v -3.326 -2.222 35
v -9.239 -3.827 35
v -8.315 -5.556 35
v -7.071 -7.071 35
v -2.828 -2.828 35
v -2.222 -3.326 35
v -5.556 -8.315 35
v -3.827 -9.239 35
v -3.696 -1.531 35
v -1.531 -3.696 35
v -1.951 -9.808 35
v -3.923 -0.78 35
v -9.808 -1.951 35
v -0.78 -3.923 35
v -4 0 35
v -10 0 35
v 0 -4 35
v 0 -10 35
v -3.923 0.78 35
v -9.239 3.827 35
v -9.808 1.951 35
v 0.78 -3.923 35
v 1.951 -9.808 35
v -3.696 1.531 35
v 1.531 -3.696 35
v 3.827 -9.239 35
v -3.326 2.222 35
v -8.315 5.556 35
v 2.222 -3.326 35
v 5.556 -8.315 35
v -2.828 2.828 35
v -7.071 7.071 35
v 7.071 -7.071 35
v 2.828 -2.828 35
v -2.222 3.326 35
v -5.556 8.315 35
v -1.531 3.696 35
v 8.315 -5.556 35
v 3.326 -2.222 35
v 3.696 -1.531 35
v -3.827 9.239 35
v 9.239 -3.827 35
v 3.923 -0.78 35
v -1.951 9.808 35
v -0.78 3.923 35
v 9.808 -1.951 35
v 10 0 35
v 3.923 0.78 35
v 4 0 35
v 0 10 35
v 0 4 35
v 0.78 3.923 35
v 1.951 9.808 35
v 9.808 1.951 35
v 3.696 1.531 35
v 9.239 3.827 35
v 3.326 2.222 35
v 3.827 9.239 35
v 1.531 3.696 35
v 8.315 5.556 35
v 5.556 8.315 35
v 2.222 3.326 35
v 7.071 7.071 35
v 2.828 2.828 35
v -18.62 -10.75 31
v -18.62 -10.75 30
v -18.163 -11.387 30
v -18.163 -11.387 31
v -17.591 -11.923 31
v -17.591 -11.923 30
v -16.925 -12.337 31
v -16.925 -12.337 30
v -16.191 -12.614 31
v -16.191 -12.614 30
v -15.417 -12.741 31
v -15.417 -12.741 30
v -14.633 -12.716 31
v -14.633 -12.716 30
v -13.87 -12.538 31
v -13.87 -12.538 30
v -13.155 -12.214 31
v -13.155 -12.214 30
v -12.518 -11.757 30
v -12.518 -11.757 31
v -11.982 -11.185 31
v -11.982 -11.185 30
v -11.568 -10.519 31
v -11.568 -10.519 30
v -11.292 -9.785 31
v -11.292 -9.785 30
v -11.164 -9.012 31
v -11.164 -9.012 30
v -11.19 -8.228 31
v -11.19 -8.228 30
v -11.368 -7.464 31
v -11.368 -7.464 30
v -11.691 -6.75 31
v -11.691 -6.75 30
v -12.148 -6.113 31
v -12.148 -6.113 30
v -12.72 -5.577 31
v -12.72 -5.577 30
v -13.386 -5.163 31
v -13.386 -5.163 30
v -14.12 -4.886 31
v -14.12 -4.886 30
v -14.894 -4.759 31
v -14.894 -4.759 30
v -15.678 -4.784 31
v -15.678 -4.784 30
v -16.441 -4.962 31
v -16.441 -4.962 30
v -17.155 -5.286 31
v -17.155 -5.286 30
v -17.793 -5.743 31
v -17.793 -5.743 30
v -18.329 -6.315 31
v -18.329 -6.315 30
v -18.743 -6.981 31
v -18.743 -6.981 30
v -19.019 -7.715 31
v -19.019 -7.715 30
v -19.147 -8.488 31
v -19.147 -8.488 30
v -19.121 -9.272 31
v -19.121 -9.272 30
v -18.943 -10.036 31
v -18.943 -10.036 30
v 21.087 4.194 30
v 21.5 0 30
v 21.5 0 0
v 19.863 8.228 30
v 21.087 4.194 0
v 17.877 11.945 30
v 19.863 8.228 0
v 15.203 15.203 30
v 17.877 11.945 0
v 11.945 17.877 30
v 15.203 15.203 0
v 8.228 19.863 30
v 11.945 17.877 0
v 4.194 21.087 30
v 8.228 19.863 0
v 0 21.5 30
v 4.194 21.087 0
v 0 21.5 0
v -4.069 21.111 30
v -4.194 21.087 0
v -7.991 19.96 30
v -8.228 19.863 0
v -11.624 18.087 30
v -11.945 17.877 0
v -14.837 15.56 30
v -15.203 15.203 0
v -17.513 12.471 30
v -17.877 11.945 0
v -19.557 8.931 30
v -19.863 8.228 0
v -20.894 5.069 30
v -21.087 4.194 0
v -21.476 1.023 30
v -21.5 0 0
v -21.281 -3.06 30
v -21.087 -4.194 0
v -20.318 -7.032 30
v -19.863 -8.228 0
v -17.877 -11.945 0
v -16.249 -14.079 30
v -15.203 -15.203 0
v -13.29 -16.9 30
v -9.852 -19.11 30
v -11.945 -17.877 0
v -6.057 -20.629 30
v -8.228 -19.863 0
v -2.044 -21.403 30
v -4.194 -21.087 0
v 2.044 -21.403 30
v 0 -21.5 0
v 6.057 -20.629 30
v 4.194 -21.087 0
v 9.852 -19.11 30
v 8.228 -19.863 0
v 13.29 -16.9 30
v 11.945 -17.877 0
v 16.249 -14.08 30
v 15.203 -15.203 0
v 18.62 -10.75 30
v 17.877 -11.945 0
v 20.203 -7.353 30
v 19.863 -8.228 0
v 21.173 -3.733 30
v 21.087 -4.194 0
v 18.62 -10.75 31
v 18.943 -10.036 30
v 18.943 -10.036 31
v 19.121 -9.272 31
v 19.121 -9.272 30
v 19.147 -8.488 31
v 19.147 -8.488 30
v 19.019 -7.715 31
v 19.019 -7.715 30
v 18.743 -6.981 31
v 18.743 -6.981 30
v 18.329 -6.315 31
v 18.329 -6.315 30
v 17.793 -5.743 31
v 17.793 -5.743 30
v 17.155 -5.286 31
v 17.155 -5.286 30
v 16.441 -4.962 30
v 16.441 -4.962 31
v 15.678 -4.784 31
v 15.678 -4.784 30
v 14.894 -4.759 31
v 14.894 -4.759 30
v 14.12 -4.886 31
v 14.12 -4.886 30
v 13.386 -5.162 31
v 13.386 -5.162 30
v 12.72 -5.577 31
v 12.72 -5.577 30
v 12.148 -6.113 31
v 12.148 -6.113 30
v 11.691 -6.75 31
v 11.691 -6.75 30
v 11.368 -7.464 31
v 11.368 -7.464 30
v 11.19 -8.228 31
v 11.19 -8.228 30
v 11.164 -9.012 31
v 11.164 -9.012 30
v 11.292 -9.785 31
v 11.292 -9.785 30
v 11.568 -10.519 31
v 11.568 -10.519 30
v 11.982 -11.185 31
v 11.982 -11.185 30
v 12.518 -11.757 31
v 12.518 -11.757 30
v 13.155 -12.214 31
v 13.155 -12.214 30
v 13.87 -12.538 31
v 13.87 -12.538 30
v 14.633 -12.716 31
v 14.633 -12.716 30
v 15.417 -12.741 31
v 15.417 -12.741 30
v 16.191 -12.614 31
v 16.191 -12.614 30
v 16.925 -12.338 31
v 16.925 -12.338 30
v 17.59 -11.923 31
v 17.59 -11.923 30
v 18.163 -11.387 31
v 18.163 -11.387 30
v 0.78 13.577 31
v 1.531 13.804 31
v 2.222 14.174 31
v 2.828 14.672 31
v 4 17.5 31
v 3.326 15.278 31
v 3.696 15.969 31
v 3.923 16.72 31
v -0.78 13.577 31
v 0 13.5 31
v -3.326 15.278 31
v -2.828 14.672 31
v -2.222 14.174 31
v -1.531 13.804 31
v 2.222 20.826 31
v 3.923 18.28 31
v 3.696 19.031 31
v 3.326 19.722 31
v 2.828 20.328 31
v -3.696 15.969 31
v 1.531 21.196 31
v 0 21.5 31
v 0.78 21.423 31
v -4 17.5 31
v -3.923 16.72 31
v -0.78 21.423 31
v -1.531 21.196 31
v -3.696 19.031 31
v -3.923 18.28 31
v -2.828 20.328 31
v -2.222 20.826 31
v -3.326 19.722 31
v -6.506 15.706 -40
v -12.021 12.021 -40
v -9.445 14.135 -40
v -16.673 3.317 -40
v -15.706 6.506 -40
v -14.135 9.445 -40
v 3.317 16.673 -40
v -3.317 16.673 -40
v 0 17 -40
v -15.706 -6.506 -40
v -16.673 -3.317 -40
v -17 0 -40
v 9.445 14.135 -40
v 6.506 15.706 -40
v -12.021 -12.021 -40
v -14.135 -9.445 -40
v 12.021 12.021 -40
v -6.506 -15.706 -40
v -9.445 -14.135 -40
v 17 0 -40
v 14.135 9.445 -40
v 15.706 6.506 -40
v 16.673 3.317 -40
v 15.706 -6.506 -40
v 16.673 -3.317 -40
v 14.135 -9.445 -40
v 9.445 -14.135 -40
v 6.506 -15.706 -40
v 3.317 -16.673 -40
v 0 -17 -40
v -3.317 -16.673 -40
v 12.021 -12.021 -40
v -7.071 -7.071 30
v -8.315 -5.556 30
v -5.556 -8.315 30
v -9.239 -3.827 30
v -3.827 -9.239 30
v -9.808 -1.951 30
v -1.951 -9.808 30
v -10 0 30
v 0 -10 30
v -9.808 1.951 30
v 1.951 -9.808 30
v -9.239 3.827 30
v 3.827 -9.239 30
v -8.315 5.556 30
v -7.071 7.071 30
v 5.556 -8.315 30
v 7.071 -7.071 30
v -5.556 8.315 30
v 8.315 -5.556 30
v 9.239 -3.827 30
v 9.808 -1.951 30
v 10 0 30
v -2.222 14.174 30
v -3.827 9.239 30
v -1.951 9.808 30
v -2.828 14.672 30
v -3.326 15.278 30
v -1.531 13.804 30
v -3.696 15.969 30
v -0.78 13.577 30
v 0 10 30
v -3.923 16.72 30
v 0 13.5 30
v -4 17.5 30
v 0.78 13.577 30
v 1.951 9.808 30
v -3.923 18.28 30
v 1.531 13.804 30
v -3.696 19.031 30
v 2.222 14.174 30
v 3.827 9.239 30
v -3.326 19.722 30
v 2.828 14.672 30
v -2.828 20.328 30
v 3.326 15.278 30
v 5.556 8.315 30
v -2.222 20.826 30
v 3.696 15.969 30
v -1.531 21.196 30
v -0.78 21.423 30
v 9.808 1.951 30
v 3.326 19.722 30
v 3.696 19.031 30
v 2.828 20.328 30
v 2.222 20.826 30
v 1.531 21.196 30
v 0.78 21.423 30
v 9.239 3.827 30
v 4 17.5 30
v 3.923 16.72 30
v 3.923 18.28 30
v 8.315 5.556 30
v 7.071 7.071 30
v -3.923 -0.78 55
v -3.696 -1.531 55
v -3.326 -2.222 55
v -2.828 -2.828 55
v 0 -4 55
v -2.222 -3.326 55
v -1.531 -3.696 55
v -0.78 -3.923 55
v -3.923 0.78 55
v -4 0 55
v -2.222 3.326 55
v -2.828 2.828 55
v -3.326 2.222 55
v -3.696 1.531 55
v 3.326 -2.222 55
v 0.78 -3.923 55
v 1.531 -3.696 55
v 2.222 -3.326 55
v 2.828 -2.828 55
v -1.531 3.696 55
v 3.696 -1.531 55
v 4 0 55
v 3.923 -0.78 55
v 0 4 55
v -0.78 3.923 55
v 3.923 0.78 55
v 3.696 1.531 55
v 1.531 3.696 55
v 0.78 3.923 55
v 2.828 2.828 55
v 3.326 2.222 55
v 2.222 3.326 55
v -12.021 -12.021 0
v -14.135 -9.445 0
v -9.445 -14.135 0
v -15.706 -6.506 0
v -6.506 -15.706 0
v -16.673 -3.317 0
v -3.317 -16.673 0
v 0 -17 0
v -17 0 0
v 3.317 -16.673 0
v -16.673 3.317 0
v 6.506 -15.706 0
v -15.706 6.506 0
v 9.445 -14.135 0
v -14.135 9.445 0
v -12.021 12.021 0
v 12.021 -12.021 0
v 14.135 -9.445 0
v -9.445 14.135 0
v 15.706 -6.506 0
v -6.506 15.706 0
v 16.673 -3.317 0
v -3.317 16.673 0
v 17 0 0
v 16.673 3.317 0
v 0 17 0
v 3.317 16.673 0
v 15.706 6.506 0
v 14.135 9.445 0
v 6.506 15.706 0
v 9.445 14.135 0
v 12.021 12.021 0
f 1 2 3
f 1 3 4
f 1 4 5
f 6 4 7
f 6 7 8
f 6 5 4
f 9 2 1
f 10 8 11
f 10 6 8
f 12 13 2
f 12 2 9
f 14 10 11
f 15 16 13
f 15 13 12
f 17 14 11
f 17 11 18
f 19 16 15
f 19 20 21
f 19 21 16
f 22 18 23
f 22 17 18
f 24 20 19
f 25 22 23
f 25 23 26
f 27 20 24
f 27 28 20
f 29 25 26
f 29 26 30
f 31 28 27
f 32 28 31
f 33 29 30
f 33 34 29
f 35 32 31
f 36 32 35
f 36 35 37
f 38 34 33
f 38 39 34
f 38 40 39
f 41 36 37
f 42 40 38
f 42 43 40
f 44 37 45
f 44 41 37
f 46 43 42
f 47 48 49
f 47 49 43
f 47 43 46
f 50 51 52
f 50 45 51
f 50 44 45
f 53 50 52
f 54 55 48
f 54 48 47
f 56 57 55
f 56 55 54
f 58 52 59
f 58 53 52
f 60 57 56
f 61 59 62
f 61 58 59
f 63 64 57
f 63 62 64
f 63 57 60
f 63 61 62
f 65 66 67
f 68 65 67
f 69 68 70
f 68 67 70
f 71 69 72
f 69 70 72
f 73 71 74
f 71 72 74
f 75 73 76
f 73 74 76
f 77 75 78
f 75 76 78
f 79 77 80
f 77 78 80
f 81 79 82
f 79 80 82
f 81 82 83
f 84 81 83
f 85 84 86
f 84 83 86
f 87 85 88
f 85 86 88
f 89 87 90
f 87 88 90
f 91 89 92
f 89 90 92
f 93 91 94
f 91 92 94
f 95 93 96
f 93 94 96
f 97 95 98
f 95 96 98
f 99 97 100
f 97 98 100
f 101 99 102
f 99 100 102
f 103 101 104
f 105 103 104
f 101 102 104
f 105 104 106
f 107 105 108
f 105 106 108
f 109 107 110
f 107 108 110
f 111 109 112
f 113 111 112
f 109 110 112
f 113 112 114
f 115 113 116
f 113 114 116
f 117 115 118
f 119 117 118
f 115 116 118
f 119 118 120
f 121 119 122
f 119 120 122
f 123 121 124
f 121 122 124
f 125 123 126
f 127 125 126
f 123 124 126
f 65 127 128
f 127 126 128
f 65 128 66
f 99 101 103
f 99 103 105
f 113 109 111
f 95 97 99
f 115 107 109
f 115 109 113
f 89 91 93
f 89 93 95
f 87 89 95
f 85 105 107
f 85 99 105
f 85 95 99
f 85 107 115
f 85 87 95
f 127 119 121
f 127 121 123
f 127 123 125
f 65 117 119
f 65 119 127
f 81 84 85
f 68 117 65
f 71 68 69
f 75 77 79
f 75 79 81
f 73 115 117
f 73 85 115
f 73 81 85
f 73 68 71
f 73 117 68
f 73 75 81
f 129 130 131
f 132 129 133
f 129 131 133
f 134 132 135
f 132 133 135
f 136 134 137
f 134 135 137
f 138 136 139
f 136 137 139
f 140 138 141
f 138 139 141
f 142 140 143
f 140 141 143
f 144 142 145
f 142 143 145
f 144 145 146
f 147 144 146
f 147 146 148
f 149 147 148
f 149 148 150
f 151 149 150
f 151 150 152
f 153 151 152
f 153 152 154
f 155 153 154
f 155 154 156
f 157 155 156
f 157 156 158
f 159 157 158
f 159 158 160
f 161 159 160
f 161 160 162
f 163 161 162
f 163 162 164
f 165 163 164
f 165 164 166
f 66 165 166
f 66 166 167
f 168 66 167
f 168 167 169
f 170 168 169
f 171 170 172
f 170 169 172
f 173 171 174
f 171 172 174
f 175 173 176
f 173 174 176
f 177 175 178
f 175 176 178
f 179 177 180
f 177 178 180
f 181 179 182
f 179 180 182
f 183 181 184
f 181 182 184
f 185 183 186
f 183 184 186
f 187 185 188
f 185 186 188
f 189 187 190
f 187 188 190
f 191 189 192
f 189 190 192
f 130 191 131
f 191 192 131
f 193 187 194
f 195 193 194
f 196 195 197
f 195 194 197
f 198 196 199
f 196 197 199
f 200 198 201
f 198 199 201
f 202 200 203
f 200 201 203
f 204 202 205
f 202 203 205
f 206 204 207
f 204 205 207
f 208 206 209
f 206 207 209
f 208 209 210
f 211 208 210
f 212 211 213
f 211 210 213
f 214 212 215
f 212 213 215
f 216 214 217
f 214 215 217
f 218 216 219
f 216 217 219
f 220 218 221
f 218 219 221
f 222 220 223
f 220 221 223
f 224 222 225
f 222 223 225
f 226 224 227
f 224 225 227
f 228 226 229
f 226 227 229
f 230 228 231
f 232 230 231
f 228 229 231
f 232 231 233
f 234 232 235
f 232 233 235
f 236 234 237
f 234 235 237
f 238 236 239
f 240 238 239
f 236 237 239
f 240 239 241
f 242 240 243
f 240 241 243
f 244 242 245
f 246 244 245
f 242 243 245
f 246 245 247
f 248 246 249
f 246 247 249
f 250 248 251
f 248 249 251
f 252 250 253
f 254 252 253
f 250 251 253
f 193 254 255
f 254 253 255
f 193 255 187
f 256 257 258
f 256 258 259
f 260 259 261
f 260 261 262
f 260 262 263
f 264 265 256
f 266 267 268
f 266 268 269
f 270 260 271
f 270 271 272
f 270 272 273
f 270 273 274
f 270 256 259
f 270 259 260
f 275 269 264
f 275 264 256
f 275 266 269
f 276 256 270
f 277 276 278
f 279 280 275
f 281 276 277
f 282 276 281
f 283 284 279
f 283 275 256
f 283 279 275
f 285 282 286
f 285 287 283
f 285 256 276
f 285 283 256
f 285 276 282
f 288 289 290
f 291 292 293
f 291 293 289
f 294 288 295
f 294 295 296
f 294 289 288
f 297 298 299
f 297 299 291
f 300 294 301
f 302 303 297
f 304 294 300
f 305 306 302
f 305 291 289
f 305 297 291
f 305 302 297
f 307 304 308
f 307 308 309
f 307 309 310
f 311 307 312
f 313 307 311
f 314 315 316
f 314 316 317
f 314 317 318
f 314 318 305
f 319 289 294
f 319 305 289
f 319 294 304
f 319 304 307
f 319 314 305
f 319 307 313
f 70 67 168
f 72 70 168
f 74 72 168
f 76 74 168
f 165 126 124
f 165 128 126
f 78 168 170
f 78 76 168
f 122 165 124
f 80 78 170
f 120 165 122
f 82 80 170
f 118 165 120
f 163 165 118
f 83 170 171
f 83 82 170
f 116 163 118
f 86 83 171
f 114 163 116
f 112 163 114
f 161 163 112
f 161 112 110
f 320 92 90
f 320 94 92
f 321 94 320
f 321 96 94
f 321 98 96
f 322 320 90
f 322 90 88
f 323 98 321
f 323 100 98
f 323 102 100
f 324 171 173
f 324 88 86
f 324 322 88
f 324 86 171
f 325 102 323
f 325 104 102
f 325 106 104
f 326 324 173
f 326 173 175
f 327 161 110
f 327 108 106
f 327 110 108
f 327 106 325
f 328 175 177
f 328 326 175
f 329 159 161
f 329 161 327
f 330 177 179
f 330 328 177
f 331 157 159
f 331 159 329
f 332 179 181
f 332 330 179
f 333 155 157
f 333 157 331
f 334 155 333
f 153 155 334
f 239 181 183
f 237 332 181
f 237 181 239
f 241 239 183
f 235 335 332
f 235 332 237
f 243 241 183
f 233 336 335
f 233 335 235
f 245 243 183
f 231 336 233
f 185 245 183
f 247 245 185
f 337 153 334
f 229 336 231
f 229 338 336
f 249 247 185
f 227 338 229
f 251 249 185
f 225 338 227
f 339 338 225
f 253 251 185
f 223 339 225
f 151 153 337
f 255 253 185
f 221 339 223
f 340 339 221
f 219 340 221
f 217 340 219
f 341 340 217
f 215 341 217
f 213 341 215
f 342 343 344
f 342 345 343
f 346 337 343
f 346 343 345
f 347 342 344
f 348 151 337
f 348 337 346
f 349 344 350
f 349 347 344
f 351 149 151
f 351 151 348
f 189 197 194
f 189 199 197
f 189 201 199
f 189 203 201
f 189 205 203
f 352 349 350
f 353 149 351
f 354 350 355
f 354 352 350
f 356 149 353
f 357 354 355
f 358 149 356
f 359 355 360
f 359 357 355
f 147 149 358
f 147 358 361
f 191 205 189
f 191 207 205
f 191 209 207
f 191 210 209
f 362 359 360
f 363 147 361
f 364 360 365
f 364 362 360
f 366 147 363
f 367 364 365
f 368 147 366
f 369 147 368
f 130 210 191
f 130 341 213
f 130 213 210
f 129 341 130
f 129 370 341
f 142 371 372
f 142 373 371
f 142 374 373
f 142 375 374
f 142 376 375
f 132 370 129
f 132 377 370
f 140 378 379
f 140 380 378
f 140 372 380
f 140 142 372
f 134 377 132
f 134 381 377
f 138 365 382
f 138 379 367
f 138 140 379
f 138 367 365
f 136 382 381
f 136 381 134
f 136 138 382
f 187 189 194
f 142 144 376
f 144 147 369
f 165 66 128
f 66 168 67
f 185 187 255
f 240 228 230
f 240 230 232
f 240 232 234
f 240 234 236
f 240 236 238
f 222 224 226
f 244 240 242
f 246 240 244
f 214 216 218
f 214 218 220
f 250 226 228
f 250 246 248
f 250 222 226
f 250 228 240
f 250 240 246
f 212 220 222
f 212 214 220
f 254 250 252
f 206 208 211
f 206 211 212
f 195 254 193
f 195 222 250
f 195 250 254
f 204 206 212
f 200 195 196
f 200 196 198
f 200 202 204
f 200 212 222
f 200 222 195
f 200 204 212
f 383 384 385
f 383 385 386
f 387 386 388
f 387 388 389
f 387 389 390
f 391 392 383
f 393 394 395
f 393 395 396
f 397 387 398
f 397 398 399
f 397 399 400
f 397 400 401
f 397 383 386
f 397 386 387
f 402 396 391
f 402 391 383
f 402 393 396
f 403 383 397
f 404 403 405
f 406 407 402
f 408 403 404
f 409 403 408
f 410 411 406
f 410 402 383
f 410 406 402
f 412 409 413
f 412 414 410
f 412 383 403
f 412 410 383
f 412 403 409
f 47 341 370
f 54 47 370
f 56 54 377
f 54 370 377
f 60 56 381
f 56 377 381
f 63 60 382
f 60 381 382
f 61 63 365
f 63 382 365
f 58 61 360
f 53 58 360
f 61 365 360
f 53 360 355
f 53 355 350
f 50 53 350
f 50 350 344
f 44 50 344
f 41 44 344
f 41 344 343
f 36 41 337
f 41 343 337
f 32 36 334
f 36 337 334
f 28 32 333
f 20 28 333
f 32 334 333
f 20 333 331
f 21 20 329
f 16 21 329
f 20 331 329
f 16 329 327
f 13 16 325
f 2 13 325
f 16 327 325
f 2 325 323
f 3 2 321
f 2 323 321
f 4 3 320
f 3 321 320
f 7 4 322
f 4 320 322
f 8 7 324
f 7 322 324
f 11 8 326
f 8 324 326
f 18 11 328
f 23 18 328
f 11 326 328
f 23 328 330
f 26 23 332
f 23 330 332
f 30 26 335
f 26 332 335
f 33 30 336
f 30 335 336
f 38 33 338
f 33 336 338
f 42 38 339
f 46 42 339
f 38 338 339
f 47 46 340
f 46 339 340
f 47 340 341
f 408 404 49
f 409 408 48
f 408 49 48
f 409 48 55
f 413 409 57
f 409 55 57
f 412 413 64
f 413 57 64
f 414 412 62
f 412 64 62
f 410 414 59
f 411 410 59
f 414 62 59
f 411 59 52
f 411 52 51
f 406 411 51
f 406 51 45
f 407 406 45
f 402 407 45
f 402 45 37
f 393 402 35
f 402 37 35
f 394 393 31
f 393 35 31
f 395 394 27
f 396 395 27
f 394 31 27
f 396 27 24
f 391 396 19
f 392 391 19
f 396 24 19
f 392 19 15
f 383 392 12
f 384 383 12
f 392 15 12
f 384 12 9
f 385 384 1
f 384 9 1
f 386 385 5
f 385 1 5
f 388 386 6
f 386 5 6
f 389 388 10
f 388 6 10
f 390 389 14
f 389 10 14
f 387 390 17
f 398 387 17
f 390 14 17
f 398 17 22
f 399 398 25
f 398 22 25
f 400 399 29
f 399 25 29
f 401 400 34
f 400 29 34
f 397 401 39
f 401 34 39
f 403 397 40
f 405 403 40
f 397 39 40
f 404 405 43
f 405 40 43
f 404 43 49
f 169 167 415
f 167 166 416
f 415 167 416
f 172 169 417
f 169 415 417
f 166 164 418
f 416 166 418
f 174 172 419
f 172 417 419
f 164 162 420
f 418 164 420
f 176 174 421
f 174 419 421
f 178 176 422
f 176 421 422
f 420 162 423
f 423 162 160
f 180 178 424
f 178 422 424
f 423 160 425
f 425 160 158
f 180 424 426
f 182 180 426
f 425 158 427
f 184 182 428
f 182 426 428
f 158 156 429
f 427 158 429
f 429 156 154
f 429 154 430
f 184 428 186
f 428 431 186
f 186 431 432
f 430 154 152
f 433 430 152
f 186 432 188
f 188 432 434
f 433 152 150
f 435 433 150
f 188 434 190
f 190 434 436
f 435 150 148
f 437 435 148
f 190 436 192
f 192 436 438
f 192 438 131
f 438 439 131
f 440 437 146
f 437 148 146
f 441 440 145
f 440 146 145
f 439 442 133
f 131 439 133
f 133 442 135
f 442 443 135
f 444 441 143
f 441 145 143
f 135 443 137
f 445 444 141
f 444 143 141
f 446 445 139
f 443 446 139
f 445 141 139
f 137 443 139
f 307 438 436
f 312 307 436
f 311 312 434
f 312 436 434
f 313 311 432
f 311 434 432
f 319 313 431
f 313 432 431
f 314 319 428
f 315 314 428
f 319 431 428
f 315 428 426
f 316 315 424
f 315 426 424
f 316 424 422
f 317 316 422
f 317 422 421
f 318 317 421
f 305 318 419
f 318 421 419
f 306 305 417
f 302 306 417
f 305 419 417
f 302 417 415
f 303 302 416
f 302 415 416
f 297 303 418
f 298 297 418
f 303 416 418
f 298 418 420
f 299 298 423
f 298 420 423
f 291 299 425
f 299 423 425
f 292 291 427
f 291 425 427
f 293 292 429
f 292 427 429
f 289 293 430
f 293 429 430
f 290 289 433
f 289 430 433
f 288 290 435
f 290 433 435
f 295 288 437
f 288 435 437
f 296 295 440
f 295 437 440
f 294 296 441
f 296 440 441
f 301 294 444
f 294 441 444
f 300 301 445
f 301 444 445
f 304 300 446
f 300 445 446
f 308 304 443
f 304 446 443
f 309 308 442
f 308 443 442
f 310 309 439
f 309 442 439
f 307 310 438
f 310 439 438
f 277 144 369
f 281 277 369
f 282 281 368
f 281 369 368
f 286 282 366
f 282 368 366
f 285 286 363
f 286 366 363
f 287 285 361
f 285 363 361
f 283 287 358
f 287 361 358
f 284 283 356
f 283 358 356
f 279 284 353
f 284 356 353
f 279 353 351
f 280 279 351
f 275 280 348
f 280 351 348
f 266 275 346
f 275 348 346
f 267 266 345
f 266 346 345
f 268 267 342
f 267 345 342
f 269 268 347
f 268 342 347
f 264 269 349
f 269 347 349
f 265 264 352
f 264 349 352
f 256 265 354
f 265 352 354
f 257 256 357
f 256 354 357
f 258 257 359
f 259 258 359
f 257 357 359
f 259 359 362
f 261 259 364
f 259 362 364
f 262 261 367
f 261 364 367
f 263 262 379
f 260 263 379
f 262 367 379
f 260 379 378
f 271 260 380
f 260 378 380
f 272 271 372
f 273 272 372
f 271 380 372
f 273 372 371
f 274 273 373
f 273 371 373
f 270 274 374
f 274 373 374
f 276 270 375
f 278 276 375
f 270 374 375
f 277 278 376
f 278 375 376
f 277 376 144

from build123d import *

# Parameters (mm, degrees)
ESQUISSE1_R      = 21.5
EXTRUSION1_DEPTH = 30
ESQUISSE2_R      = 10
EXTRUSION2_DEPTH = 5
ESQUISSE3_R      = 4
EXTRUSION3_DEPTH = 20
ESQUISSE4_R      = 17
EXTRUSION4_DEPTH = 40
ESQUISSE5_R      = 4
EXTRUSION5_DEPTH = 1


with BuildPart() as part:
    # Esquisse1 → Extrusion1 (new body)
    with BuildSketch(Plane.XY):
        Circle(ESQUISSE1_R)
    extrude(amount=EXTRUSION1_DEPTH)

    # Esquisse2 → Extrusion2 (add)
    with BuildSketch(Plane.XY.offset(30)):
        Circle(ESQUISSE2_R)
    extrude(amount=EXTRUSION2_DEPTH)

    # Esquisse3 → Extrusion3 (add)
    with BuildSketch(Plane.XY.offset(35)):
        Circle(ESQUISSE3_R)
    extrude(amount=EXTRUSION3_DEPTH)

    # Esquisse4 → Extrusion4 (add)
    with BuildSketch(Plane(origin=(0, 0, 0), x_dir=(-1, 0, 0), z_dir=(0, 0, -1))):
        with Locations(Location((0, 0, 0), (0, 0, 180))):
            Circle(ESQUISSE4_R)
    extrude(amount=EXTRUSION4_DEPTH)

    # Esquisse5 → Extrusion5 (add)
    with BuildSketch(Plane.XY.offset(30)):
        with Locations(Location((0, 17.5, 0), (0, 0, 89.999550935))):
            Circle(ESQUISSE5_R)
        with Locations(Location((-15.155444566, -8.75, 0), (0, 0, 209.999550935))):
            Circle(ESQUISSE5_R)
        with Locations(Location((15.155444566, -8.75, 0), (0, 0, 329.999550935))):
            Circle(ESQUISSE5_R)
    extrude(amount=EXTRUSION5_DEPTH)


solid = part.part
